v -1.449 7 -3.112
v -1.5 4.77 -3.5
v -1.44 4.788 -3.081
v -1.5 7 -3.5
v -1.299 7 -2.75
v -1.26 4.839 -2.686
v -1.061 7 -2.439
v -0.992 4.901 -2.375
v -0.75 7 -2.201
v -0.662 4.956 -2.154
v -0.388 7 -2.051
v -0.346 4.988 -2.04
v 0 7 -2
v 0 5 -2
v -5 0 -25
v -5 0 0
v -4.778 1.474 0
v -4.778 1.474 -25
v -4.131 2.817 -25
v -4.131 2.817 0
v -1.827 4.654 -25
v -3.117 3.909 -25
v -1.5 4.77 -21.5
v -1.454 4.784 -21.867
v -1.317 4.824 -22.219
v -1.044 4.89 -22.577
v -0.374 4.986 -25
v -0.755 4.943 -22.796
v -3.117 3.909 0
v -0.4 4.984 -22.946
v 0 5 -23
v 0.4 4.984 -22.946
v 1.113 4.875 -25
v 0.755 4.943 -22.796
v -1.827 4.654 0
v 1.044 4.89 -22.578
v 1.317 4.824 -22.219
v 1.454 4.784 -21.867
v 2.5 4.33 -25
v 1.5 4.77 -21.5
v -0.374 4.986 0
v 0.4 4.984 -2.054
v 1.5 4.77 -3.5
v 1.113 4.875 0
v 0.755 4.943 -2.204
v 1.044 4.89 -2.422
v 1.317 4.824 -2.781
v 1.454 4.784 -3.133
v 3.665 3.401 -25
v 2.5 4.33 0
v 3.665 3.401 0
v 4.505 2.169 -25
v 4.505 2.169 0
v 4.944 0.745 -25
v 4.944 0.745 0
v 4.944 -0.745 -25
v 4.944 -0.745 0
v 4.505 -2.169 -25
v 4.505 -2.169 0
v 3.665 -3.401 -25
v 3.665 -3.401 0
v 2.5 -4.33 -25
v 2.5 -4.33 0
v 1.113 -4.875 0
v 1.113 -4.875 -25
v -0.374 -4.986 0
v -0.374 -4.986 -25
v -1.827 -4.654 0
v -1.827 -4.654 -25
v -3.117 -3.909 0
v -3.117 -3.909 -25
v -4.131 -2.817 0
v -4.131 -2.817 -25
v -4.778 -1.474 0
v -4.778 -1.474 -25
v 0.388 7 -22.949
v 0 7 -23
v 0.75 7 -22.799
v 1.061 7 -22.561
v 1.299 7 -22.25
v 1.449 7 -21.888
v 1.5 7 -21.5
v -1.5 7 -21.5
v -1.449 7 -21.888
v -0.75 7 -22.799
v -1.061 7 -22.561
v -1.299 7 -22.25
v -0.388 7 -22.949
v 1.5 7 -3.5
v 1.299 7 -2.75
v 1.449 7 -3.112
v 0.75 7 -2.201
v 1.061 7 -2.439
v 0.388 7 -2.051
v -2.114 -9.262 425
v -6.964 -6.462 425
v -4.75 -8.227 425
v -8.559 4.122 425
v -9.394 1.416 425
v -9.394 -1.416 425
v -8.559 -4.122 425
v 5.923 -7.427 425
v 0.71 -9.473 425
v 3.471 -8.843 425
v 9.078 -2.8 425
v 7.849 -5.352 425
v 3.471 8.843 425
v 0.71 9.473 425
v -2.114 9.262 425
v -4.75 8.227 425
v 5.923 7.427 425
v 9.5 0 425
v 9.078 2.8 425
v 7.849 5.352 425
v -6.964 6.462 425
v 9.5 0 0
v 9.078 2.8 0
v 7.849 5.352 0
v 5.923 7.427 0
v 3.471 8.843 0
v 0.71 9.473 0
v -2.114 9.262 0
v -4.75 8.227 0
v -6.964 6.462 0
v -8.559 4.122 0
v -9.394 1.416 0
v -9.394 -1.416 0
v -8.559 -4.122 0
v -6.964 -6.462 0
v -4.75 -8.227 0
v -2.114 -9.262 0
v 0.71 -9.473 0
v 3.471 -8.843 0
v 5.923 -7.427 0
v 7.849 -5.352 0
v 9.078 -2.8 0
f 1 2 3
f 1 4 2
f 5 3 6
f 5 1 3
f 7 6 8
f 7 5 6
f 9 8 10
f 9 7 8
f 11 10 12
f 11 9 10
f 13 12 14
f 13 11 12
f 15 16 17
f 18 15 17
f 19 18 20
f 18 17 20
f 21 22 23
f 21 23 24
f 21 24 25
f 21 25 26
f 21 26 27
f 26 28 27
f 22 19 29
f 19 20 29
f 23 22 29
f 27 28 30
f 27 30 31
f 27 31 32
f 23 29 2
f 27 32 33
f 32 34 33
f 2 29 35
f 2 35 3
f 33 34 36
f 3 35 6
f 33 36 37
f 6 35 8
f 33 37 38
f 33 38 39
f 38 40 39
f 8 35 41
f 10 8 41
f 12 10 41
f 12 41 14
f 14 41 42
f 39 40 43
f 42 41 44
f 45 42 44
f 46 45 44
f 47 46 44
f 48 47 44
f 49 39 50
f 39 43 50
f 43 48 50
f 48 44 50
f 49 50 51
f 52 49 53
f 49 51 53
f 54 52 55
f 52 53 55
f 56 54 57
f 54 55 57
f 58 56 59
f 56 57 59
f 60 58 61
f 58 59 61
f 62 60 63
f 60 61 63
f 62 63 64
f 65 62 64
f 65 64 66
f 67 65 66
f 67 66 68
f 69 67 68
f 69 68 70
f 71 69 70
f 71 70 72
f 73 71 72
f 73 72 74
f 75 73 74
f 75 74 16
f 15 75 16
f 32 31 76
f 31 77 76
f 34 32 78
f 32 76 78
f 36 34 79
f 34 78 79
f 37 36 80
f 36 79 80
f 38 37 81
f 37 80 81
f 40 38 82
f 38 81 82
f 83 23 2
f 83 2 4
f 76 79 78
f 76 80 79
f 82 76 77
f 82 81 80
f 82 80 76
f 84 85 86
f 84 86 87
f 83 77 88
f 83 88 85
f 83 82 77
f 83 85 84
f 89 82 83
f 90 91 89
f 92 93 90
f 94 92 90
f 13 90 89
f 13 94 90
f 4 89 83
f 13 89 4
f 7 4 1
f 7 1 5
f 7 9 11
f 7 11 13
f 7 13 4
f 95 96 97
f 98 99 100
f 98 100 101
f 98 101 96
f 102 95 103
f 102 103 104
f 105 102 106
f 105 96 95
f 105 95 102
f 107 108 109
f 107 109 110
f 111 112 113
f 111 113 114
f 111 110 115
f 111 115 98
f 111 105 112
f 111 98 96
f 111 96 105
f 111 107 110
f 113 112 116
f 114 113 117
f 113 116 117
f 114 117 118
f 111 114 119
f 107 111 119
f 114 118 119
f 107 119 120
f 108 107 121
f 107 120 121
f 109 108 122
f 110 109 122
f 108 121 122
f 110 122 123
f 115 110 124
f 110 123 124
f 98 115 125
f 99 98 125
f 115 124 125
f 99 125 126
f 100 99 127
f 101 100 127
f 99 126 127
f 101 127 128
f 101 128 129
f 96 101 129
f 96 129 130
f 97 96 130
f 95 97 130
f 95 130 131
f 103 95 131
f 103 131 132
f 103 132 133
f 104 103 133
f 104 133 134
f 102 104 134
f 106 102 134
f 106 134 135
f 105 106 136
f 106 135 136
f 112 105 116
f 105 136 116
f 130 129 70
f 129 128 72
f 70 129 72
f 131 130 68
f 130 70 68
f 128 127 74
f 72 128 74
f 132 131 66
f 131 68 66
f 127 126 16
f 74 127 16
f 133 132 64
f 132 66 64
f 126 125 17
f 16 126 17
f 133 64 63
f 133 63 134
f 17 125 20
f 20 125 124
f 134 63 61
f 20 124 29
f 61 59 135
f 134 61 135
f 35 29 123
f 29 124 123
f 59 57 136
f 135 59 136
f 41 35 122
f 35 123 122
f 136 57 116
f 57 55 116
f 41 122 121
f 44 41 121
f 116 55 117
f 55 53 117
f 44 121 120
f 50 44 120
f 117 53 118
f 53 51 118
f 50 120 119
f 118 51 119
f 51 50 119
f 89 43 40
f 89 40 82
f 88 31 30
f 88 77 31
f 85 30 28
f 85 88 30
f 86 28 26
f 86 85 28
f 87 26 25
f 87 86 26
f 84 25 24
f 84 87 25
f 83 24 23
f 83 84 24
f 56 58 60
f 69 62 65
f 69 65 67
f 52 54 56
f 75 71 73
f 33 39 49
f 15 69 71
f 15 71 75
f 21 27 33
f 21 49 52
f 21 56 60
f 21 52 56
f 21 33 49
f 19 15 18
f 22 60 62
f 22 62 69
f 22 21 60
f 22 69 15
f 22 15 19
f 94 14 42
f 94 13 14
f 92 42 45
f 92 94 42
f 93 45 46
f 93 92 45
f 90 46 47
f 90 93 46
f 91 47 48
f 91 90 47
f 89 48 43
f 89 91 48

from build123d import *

# Parameters (mm, degrees)
SZKIC1_R                    = 9.5
DODANIE_WYCI_GNI_CIE1_DEPTH = 425
SZKIC2_R                    = 5
DODANIE_WYCI_GNI_CIE2_DEPTH = 25
SZKIC3_W                    = 3
SZKIC3_H                    = 7
DODANIE_WYCI_GNI_CIE3_DEPTH = 21
ZAOKR_GLENIE2_R             = 1.5
ZAOKR_GLENIE3_R             = 1.5


with BuildPart() as part:
    # Szkic1 → Dodanie-wyciągnięcie1 (new body)
    with BuildSketch(Plane.XY):
        Circle(SZKIC1_R)
    extrude(amount=DODANIE_WYCI_GNI_CIE1_DEPTH)

    # Szkic2 → Dodanie-wyciągnięcie2 (add)
    with BuildSketch(Plane(origin=(0, 0, 0), x_dir=(-1, 0, 0), z_dir=(0, 0, -1))):
        Circle(SZKIC2_R)
    extrude(amount=DODANIE_WYCI_GNI_CIE2_DEPTH)

    # Szkic3 → Dodanie-wyciągnięcie3 (add)
    with BuildSketch(Plane(origin=(0, 0, -2), x_dir=(-1, 0, 0), z_dir=(0, 0, -1))):
        with Locations((0, 3.5)):
            Rectangle(SZKIC3_W, SZKIC3_H)
    extrude(amount=DODANIE_WYCI_GNI_CIE3_DEPTH)

    # Zaokrąglenie2
    zaokr_glenie2_edges = [part.edges().sort_by_distance(p)[0] for p in [
        (-1.5, 5.884848004, -23),
    ]]
    fillet(zaokr_glenie2_edges, radius=ZAOKR_GLENIE2_R)

    # Zaokrąglenie3
    zaokr_glenie3_edges = [part.edges().sort_by_distance(p)[0] for p in [
        (1.5, 5.884848004, -2),
        (-1.5, 5.884848004, -2),
        (1.5, 5.884848004, -23),
    ]]
    fillet(zaokr_glenie3_edges, radius=ZAOKR_GLENIE3_R - 0.0001)  # a hair under: the kernel refuses the full size


solid = part.part
